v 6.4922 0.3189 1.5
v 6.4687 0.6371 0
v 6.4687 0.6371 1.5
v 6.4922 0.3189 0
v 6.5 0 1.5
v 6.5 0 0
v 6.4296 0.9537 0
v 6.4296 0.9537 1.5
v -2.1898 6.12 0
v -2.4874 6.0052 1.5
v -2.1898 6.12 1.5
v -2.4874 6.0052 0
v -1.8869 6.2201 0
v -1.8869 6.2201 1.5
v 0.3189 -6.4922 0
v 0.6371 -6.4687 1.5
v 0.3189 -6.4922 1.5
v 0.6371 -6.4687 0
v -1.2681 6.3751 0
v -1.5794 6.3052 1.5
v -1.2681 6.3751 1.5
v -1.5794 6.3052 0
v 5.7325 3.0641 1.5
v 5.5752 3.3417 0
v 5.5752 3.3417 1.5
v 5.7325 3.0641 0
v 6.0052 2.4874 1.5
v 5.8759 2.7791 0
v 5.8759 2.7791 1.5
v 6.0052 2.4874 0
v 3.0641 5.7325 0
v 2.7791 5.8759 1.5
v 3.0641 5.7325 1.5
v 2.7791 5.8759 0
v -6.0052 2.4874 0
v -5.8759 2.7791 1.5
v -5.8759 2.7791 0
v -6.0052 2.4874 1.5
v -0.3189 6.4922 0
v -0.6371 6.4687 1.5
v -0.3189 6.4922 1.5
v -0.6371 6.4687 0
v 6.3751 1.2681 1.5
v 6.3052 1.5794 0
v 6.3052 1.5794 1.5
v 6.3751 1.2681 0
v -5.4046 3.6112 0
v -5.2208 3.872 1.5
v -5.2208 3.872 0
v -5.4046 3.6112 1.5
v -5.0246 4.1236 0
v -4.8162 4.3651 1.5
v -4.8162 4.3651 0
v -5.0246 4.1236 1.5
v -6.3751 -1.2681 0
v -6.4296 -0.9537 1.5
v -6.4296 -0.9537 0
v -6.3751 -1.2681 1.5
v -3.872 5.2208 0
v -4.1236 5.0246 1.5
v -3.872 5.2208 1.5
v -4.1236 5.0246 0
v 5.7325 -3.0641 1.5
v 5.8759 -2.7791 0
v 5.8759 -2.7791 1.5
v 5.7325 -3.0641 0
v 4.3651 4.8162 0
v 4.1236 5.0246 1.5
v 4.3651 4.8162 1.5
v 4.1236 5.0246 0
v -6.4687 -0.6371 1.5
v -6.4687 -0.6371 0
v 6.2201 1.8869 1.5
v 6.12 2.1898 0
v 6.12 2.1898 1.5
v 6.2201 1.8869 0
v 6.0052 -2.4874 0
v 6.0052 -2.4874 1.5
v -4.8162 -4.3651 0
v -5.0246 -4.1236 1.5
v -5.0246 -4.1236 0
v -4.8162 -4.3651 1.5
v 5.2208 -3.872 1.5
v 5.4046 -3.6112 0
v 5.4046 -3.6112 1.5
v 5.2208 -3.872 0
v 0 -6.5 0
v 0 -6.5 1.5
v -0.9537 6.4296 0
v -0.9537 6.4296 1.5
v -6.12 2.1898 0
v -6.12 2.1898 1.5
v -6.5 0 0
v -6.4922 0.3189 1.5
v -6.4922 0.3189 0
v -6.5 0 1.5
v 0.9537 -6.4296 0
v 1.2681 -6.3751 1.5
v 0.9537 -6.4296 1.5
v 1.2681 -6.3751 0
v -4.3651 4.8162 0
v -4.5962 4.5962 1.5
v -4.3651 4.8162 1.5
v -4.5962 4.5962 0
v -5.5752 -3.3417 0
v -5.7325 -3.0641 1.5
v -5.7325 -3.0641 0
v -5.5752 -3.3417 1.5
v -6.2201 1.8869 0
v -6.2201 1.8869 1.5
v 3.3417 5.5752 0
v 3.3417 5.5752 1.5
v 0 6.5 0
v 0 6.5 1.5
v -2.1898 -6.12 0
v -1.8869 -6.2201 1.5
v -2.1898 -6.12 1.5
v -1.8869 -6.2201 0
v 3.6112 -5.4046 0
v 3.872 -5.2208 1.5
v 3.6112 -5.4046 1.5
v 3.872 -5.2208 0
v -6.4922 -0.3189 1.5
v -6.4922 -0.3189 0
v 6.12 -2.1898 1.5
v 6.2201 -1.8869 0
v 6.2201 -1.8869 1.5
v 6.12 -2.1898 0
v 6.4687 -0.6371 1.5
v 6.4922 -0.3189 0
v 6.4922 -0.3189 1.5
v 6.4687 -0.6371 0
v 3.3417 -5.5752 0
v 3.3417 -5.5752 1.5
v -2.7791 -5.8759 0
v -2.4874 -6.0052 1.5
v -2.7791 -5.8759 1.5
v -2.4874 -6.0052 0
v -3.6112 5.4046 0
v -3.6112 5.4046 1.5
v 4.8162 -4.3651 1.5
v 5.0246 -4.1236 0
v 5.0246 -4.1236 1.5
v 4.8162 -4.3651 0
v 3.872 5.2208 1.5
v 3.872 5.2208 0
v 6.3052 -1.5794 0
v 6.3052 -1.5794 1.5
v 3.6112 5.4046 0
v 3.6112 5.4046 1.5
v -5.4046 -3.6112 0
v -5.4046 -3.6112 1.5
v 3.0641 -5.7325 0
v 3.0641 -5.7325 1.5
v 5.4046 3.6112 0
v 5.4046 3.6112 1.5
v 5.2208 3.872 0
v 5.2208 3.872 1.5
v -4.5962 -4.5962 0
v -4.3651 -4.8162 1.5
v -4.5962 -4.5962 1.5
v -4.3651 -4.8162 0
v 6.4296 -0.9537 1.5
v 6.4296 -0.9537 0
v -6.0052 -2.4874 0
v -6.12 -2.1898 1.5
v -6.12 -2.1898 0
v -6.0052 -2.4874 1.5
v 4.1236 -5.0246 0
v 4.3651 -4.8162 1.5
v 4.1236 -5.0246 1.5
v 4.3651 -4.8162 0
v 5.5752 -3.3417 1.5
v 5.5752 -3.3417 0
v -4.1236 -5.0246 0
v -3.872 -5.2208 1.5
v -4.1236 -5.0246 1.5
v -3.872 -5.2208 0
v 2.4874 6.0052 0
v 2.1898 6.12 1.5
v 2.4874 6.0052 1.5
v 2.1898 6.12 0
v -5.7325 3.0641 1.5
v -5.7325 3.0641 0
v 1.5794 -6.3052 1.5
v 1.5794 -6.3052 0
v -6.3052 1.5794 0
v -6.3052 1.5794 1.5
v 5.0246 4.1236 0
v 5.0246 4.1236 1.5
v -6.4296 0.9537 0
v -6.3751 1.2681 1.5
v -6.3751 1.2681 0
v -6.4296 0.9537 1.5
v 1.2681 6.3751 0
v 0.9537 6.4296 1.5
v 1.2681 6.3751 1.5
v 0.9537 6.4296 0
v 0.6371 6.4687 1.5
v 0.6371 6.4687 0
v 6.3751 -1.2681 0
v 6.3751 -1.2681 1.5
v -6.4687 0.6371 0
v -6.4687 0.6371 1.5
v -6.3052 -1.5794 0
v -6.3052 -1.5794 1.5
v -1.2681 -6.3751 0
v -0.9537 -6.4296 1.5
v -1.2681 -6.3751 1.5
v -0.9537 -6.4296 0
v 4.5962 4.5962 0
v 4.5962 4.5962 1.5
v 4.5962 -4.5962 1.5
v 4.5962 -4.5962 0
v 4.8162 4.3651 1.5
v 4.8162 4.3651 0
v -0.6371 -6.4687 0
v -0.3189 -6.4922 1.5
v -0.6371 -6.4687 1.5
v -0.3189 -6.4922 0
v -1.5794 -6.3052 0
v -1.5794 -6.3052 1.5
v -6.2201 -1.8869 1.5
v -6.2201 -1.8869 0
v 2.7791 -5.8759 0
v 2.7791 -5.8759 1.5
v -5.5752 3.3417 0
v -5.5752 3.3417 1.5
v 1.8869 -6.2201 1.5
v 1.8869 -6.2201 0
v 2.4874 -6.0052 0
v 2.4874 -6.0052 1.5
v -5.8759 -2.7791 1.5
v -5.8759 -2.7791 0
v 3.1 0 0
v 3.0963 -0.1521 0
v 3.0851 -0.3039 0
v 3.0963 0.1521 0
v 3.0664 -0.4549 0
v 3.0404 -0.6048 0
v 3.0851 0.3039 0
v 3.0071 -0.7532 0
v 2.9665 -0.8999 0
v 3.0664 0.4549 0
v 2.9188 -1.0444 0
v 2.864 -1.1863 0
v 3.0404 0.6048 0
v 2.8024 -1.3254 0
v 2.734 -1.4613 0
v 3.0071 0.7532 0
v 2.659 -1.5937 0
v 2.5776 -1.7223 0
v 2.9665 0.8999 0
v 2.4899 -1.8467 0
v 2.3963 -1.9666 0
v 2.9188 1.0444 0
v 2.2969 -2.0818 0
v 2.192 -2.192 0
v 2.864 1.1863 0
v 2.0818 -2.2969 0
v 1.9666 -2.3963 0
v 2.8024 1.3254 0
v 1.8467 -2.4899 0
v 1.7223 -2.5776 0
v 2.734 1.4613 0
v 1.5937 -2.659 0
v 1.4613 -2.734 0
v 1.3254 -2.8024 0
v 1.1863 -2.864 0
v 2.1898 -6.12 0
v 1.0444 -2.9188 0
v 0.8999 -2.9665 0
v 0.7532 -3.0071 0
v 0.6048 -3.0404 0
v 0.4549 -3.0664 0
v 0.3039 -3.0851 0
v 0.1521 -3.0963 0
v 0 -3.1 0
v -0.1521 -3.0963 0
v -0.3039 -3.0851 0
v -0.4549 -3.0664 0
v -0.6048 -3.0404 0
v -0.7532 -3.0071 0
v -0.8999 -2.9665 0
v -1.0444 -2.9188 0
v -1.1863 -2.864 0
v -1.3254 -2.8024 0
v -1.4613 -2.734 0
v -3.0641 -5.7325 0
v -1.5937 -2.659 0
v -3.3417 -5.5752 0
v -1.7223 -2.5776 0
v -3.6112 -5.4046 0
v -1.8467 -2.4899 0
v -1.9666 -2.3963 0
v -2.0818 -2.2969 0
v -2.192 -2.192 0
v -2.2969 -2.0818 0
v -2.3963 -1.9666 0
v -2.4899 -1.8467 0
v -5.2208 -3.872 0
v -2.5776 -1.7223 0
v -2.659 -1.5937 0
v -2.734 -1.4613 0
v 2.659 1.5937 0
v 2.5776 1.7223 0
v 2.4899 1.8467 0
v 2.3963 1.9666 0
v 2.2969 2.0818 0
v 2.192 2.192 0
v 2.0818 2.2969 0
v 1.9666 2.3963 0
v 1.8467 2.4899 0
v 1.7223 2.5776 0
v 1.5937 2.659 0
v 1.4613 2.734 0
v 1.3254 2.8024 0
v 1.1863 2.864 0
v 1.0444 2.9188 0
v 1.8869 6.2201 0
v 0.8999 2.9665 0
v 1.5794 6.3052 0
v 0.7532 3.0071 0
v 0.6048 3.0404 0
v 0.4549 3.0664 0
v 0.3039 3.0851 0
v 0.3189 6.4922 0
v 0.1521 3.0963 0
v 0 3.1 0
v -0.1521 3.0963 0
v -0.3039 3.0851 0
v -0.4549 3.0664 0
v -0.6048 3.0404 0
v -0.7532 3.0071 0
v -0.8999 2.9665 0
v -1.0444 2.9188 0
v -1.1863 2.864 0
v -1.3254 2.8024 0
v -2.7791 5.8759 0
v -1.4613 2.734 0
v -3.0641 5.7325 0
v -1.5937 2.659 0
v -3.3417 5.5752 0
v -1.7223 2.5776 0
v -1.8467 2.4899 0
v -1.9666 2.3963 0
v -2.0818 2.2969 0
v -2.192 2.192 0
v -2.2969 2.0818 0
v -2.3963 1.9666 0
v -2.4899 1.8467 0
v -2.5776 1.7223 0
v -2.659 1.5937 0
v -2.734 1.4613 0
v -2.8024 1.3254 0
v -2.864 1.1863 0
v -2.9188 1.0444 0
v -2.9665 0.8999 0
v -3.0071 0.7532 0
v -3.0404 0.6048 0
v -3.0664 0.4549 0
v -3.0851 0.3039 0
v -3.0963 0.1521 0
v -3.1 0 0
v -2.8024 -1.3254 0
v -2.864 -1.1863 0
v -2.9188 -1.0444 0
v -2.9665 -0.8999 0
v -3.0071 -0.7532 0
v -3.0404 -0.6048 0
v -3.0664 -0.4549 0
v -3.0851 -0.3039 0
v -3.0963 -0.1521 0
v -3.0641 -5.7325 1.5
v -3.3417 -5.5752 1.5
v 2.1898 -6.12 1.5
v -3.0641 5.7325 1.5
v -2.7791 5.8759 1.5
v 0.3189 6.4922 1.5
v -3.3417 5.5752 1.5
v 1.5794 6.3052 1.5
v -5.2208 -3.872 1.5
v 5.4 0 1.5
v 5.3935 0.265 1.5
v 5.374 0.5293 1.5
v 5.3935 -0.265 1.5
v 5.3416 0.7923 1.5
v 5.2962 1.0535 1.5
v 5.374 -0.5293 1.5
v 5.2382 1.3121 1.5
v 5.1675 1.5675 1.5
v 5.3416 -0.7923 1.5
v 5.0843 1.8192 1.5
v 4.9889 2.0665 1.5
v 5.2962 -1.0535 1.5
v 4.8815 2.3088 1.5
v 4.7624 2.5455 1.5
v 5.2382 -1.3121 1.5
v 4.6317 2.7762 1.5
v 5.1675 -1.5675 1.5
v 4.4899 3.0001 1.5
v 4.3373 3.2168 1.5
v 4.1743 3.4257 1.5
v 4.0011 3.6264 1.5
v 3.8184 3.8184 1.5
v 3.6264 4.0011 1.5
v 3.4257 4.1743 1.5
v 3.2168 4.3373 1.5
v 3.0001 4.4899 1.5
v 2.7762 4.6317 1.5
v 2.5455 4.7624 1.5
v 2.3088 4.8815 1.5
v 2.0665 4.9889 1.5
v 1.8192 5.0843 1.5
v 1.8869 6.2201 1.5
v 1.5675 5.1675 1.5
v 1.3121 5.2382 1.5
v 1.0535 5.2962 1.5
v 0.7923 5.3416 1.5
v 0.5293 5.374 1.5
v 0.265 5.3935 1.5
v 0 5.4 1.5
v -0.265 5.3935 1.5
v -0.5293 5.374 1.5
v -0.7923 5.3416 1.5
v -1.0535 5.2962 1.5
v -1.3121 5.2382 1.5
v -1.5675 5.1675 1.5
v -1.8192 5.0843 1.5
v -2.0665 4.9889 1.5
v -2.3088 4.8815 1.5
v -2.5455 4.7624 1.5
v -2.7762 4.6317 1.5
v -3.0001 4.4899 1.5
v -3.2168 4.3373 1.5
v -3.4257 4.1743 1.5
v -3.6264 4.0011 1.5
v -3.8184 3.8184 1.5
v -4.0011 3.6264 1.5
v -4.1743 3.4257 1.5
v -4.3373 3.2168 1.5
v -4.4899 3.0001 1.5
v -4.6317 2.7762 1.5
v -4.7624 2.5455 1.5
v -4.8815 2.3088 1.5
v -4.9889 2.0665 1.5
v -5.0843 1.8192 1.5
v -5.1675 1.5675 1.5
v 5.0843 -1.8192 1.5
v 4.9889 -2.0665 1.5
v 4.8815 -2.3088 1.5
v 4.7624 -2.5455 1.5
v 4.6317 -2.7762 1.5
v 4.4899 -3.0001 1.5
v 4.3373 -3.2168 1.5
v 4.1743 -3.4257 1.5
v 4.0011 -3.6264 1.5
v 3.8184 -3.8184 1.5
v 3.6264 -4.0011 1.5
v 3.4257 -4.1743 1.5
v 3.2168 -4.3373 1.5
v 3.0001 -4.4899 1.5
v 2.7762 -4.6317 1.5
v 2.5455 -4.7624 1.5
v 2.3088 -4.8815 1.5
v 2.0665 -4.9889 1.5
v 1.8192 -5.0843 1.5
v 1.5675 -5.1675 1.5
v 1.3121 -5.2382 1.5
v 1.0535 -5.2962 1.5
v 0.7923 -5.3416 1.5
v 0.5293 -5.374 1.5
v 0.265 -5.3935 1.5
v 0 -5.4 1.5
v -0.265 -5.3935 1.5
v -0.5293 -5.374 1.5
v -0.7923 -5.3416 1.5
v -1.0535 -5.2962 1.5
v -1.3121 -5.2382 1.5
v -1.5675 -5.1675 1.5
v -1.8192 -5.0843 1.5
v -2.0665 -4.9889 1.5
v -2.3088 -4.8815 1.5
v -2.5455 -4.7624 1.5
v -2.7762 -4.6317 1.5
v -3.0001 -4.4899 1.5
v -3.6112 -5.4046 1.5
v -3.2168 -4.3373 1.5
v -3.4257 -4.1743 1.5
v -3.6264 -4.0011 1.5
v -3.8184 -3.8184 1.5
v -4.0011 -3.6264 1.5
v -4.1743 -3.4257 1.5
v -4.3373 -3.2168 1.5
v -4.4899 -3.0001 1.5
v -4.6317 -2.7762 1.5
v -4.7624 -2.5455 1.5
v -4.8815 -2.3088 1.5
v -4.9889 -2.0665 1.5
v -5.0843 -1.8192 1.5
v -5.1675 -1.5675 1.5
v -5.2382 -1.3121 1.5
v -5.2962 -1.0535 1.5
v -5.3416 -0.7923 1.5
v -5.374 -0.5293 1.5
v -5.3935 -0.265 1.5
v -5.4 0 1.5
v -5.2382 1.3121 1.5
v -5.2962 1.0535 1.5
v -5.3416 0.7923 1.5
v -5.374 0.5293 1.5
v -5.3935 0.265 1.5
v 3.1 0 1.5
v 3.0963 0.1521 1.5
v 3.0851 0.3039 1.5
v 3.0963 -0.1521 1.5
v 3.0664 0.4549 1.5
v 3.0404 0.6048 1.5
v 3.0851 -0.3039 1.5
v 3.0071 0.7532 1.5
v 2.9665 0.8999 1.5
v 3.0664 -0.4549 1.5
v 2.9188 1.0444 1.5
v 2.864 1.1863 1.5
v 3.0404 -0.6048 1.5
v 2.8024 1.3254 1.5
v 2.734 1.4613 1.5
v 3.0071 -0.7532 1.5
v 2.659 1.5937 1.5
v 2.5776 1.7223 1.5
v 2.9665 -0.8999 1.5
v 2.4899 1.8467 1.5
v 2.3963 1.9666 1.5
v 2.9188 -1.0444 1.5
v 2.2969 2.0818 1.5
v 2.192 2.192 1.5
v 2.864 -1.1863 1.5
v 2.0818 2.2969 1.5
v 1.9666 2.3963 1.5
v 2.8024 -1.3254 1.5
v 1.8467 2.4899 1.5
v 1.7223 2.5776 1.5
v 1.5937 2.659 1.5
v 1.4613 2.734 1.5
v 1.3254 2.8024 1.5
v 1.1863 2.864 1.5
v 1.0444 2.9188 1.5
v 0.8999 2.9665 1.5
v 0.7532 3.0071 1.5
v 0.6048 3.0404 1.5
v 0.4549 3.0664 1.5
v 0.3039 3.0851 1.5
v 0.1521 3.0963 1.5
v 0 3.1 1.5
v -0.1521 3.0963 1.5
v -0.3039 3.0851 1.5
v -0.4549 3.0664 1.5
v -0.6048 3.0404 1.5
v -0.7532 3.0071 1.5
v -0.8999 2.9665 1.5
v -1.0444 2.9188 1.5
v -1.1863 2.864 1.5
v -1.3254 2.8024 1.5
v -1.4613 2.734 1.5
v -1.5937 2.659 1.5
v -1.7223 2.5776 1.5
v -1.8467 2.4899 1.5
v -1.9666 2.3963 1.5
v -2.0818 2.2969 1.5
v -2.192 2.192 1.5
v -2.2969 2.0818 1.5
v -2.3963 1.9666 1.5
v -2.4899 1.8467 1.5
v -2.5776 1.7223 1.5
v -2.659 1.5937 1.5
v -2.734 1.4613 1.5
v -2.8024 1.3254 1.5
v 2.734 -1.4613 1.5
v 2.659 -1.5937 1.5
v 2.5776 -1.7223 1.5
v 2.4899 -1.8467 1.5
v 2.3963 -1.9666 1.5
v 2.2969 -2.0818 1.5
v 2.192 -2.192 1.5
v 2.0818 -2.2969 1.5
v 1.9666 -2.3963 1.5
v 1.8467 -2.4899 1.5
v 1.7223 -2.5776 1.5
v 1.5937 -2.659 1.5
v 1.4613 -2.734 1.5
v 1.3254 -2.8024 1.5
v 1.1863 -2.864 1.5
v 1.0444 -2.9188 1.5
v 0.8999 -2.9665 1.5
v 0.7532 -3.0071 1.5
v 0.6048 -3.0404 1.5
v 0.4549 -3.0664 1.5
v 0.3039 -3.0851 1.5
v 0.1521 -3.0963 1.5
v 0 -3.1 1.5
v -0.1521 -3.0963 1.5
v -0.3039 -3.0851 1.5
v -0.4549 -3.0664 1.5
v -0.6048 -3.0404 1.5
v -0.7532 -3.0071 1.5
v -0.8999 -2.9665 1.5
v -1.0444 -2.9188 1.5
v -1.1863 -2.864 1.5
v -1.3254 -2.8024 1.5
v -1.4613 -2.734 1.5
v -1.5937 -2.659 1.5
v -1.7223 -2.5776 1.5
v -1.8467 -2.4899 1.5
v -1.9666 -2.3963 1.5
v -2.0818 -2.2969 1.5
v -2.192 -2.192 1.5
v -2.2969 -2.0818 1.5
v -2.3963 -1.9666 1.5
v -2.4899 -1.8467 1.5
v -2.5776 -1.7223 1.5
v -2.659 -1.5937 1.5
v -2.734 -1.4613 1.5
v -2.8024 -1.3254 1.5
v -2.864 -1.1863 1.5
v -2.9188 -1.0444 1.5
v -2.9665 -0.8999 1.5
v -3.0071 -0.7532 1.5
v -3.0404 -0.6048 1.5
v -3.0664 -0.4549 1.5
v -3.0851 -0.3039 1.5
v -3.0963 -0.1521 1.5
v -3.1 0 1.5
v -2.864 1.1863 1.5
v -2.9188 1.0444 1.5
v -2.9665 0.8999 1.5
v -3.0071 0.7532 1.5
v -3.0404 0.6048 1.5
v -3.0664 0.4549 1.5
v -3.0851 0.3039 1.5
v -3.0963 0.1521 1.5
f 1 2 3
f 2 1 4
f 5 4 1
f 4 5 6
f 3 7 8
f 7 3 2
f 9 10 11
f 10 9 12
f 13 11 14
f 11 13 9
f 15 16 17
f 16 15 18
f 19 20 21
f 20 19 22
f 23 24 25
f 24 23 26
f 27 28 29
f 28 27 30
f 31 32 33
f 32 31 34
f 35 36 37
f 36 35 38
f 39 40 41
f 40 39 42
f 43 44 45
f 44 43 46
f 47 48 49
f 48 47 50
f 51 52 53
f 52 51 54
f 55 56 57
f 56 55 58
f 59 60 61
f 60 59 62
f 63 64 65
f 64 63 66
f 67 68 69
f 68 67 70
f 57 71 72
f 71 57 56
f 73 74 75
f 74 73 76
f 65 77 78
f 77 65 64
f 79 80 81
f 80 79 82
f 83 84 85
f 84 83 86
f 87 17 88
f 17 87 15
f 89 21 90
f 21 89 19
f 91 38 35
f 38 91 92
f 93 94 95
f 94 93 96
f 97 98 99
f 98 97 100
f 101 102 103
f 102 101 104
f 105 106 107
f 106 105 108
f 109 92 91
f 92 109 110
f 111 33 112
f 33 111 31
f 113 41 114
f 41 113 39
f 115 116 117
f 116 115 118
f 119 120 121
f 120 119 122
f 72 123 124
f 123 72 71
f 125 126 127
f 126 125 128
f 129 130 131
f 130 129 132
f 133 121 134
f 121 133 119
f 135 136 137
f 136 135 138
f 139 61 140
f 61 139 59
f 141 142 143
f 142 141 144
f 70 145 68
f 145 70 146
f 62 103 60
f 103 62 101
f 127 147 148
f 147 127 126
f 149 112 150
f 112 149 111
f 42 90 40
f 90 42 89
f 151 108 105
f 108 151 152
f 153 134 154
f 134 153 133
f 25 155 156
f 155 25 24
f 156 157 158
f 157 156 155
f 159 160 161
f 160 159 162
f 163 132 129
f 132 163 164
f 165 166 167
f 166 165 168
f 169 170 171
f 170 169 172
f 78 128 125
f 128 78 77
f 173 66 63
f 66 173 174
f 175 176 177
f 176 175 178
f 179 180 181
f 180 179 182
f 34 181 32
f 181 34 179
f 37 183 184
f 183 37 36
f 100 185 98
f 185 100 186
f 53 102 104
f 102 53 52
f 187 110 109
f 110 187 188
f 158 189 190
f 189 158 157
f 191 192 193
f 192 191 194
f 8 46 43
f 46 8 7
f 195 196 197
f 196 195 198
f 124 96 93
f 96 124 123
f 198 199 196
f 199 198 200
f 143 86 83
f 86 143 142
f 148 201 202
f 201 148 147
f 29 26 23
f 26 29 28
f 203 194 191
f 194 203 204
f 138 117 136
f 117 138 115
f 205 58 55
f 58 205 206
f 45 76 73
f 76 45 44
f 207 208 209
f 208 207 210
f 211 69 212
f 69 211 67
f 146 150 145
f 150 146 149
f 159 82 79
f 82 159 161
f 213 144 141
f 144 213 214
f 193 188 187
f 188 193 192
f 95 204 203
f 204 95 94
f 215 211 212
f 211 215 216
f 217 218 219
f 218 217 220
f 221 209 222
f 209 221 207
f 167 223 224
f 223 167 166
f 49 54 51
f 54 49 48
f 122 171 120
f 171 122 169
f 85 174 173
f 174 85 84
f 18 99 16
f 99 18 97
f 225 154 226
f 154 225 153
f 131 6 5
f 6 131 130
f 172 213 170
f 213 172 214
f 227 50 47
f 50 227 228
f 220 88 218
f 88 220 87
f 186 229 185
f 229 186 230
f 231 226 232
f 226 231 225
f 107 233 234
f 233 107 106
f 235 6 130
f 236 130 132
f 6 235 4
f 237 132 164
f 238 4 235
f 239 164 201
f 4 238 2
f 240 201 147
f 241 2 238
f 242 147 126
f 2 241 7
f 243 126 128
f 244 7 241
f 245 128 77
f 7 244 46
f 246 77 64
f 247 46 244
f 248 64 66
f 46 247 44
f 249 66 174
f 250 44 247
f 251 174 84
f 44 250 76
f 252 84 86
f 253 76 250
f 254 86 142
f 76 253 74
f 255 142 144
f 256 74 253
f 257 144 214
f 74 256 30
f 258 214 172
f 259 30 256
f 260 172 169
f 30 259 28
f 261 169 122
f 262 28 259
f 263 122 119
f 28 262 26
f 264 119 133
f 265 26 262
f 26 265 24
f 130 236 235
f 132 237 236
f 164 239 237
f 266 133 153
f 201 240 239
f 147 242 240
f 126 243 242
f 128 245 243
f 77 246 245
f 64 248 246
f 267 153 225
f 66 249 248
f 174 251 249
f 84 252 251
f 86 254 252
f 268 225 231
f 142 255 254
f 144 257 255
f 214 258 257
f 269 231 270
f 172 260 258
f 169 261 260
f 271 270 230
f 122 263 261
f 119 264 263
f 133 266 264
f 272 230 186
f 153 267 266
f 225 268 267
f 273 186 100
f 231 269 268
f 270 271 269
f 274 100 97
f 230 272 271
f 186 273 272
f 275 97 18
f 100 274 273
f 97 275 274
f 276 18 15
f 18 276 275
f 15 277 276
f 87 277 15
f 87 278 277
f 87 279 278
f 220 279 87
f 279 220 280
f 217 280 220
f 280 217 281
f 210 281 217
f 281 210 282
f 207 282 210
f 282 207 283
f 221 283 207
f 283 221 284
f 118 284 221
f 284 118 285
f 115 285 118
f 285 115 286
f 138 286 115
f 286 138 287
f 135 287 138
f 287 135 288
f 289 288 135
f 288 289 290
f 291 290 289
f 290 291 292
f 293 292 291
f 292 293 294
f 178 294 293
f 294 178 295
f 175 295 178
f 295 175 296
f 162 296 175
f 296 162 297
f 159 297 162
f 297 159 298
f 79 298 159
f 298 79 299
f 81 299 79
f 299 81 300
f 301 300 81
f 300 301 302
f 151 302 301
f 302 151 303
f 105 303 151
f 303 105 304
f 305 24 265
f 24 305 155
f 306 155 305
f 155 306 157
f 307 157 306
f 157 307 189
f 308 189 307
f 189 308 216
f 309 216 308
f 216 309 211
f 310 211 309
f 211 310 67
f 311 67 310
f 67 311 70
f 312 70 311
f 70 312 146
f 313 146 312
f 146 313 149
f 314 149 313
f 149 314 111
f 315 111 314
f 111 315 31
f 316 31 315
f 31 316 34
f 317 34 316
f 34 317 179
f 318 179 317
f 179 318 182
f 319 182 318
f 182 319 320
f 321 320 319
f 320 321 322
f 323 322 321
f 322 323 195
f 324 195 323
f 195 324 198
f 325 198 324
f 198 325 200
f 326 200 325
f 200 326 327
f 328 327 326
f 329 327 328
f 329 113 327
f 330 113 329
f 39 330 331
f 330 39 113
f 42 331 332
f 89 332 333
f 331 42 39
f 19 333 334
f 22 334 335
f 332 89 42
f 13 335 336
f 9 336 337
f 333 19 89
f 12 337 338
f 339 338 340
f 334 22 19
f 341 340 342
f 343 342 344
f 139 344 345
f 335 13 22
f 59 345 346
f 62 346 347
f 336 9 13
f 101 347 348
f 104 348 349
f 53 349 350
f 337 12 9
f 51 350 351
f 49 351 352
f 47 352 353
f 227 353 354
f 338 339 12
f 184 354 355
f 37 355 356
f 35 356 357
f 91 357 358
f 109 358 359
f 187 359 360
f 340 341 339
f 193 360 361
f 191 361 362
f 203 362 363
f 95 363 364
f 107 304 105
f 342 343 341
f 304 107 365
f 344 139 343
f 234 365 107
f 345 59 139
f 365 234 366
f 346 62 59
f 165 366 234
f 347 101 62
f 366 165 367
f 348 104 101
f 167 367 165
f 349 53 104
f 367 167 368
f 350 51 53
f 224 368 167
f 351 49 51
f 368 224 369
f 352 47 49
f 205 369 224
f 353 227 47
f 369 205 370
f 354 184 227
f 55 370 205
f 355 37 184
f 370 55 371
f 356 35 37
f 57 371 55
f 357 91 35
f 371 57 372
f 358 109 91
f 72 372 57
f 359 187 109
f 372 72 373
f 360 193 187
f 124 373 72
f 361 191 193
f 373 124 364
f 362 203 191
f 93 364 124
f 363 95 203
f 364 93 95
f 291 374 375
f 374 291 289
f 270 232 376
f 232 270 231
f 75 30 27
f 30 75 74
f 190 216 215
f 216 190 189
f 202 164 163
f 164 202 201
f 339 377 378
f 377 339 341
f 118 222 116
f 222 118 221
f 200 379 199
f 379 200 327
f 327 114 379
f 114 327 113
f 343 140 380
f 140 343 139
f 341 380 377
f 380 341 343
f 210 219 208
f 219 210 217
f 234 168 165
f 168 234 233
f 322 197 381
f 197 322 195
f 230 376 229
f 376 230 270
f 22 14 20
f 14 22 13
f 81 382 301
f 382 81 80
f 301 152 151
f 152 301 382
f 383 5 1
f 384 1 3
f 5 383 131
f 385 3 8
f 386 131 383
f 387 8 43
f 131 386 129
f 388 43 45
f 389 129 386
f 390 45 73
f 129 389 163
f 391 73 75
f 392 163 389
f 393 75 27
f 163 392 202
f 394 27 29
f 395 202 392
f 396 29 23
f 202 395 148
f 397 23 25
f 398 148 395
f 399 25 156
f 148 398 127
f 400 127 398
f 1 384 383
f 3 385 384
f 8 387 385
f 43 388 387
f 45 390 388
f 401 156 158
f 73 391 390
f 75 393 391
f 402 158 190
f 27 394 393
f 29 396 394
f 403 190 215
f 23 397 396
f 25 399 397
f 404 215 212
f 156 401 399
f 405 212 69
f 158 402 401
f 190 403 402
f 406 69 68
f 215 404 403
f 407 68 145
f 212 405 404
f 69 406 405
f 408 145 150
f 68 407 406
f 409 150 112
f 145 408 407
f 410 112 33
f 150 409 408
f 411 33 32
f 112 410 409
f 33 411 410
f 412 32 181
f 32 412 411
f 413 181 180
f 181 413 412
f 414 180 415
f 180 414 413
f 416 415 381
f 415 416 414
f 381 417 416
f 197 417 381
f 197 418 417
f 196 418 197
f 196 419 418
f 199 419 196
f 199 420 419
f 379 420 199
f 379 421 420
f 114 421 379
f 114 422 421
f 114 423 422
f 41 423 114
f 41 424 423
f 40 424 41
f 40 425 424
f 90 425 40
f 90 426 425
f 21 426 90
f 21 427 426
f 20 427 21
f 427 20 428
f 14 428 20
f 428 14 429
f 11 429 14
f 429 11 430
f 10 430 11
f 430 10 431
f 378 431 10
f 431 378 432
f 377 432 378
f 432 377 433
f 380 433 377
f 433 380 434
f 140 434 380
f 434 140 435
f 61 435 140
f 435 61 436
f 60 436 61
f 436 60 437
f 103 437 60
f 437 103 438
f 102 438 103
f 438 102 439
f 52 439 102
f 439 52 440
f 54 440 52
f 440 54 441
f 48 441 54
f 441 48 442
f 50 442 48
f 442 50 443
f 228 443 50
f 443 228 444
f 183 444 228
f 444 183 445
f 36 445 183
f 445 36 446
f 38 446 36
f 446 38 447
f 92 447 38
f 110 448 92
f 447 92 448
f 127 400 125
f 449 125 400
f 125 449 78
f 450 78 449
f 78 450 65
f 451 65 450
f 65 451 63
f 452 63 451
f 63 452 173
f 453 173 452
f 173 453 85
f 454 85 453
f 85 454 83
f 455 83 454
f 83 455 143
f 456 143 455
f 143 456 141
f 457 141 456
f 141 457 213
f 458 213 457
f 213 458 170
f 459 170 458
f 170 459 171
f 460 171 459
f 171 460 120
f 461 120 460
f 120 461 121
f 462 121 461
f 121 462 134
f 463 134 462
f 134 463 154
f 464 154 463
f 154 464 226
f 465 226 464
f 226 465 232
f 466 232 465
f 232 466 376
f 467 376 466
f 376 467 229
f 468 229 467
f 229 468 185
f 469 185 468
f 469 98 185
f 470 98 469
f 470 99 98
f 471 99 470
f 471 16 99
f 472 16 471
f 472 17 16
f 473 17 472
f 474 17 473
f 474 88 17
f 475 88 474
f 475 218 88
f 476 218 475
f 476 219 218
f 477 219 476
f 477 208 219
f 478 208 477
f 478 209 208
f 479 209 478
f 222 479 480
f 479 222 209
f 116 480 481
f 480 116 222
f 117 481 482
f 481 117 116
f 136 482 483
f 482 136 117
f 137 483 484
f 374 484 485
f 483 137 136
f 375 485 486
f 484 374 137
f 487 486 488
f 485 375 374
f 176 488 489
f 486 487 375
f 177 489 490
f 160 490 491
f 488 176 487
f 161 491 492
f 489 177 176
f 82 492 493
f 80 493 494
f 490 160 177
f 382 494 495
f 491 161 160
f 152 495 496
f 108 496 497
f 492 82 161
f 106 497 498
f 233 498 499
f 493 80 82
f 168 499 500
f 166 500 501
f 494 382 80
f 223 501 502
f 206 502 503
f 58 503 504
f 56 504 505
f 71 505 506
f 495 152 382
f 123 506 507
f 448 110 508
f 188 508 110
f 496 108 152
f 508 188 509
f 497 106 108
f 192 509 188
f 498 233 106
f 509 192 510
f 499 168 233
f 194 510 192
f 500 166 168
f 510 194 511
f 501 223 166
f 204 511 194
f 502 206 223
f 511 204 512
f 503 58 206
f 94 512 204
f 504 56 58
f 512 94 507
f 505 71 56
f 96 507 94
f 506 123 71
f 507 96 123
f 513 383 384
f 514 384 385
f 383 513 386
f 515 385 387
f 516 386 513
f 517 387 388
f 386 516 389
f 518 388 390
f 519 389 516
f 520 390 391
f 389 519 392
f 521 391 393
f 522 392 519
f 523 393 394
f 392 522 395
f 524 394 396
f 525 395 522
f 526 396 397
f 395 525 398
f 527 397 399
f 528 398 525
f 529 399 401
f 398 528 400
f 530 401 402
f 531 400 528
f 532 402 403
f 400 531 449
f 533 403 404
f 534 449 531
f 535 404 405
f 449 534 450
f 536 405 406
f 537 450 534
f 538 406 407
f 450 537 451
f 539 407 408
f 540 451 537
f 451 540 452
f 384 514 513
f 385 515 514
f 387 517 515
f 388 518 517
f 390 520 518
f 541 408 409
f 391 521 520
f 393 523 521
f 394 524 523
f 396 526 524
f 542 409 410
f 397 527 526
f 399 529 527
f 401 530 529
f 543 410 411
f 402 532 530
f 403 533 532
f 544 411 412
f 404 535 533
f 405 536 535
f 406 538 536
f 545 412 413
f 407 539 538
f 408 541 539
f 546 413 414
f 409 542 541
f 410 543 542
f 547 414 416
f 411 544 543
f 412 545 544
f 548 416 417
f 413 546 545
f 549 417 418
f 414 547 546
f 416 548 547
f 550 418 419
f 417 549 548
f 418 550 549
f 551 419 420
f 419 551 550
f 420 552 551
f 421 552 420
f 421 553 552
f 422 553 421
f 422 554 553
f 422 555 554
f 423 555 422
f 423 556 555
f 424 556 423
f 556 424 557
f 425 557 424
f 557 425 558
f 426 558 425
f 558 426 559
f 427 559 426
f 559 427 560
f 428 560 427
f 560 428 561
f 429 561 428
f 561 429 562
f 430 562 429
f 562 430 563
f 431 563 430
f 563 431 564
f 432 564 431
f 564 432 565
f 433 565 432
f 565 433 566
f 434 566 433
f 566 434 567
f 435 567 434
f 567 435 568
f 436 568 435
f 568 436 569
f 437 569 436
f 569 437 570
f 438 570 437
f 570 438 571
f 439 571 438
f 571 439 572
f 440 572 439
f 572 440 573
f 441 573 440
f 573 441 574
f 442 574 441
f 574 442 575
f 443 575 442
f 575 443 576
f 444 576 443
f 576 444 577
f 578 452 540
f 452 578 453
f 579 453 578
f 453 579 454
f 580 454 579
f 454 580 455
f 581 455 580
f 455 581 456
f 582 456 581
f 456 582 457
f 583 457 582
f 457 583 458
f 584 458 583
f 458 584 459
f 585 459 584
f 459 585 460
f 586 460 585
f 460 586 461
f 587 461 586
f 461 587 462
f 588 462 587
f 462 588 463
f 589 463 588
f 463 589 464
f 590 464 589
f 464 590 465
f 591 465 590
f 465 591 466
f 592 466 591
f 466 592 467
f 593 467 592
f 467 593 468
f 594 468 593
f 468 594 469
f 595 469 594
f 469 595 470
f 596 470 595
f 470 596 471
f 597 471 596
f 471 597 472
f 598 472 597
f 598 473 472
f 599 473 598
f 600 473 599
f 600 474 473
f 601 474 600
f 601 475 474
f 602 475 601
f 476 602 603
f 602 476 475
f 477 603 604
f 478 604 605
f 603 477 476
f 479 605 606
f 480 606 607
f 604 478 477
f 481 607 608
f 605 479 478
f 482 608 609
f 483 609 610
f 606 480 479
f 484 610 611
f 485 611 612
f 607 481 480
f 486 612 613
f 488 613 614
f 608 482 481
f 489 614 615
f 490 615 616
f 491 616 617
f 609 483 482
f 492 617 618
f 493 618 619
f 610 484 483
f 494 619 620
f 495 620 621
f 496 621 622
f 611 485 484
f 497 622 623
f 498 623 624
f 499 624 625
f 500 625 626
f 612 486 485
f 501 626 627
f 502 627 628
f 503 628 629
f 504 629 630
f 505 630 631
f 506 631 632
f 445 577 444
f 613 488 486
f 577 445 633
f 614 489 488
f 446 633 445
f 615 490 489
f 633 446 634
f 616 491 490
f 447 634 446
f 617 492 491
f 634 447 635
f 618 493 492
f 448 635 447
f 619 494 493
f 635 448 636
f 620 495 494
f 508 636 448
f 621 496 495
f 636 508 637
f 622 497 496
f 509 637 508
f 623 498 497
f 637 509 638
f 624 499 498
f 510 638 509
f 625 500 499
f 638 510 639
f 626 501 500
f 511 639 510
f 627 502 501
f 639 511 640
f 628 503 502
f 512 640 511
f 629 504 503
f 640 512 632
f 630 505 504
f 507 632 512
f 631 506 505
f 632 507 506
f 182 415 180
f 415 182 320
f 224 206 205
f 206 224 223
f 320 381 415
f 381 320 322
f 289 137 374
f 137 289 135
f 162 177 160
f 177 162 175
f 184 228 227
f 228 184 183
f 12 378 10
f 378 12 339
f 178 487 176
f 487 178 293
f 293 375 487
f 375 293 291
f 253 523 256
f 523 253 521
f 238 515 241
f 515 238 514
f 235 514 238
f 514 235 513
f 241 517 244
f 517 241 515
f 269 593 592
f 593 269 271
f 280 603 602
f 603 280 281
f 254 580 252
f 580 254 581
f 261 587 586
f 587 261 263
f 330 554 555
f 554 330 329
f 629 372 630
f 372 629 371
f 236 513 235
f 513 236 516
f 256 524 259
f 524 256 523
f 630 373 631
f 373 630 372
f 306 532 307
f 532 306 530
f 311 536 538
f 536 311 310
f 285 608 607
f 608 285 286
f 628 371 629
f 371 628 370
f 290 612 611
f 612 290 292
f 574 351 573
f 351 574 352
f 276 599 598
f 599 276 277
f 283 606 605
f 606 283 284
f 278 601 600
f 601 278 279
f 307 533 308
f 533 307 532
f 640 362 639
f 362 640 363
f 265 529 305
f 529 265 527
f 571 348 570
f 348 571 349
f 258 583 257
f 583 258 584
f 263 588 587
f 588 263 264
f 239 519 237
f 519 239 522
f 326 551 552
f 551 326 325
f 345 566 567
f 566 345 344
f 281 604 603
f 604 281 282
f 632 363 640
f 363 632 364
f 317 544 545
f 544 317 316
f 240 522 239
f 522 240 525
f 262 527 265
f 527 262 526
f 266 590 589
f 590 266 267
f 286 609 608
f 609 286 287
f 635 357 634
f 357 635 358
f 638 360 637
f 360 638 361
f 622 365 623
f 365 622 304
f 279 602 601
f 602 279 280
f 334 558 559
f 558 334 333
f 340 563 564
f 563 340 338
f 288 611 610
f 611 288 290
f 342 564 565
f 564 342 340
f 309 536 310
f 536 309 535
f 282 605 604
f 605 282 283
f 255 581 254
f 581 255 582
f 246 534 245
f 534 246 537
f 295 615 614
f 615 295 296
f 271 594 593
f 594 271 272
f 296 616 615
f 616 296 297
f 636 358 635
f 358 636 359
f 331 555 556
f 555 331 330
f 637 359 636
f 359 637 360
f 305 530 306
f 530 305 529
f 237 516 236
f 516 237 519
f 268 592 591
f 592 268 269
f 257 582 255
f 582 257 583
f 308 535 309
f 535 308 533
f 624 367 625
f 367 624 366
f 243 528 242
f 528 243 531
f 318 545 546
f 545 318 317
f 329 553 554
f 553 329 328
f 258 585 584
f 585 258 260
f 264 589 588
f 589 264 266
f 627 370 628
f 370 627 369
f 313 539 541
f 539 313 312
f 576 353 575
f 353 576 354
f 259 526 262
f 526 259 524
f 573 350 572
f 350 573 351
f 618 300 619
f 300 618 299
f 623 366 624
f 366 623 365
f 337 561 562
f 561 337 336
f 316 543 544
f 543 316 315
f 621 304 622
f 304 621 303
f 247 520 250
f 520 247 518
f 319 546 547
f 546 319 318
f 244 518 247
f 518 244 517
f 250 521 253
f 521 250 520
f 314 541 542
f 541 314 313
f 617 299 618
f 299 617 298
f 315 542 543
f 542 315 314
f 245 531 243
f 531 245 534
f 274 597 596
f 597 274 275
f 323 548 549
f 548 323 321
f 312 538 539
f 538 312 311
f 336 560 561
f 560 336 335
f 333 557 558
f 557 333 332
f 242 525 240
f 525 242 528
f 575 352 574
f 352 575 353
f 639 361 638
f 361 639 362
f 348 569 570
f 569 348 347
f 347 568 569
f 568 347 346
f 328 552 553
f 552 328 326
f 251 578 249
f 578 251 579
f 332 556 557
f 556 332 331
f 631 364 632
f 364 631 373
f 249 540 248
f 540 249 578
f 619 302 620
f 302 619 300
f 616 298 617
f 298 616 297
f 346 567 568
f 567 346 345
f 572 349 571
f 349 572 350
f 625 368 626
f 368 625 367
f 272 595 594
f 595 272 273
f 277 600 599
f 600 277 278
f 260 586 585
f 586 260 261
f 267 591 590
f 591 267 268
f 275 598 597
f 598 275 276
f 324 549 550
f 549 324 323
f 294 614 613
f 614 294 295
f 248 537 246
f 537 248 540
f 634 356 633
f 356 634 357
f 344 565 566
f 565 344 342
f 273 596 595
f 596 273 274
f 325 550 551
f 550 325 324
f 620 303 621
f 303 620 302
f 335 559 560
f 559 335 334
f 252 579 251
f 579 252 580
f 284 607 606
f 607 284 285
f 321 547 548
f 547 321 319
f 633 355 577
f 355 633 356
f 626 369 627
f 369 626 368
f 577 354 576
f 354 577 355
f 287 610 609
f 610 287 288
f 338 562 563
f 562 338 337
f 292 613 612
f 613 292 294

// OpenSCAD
// Adapter Sleeve for 0.2 mL PCR tube in 1.5 mL rack
// Print orientation: Upside down (Collar on bed)
// Units: mm

// Dimensions
$fn = 128; // High resolution for smooth curves and accurate holes

// Collar (Base)
$collar_diameter = 13.0;
$collar_thickness = 1.5;

// Sleeve Body
$sleeve_outer_diameter = 10.8;
$sleeve_total_height = 21.5;

// Bore
$bore_diameter = 6.2;

// Overcuts for clean printing (Rule 5)
$overcut = 0.1;

// Calculate derived dimensions
$collar_radius = $collar_diameter / 2;
$sleeve_outer_radius = $sleeve_outer_diameter / 2;
$bore_radius = $bore_diameter / 2;

// Calculate explicit heights to avoid floating point ambiguity
$collar_height = $collar_thickness;
$sleeve_body_height = $sleeve_total_height - $collar_thickness;

// Main Body Construction
difference() {
    // 1. Create the outer shell (Collar + Sleeve Body)
    
    // Collar Cylinder (Base)
    // Rests on bed at z=0
    cylinder(
        h = $collar_height,
        r1 = $collar_radius,
        r2 = $collar_radius,
        $fn = $fn
    );
    
    // Sleeve Body Cylinder (Rising from collar)
    // Starts at z = $collar_height, ends at z = $sleeve_total_height
    translate([0, 0, $collar_height])
    cylinder(
        h = $sleeve_body_height,
        r1 = $sleeve_outer_radius,
        r2 = $sleeve_outer_radius,
        $fn = $fn
    );
    
    // 2. Cut the Bore
    // The bore runs through the full height ($sleeve_total_height)
    // We extend the cutter slightly past the top and bottom to ensure clean cuts (Rule 5)
    // Start at z = -overcut, End at z = total_height + overcut
    translate([0, 0, -$overcut])
    cylinder(
        h = ($sleeve_total_height + ($overcut * 2)),
        r = $bore_radius,
        $fn = $fn
    );
}
